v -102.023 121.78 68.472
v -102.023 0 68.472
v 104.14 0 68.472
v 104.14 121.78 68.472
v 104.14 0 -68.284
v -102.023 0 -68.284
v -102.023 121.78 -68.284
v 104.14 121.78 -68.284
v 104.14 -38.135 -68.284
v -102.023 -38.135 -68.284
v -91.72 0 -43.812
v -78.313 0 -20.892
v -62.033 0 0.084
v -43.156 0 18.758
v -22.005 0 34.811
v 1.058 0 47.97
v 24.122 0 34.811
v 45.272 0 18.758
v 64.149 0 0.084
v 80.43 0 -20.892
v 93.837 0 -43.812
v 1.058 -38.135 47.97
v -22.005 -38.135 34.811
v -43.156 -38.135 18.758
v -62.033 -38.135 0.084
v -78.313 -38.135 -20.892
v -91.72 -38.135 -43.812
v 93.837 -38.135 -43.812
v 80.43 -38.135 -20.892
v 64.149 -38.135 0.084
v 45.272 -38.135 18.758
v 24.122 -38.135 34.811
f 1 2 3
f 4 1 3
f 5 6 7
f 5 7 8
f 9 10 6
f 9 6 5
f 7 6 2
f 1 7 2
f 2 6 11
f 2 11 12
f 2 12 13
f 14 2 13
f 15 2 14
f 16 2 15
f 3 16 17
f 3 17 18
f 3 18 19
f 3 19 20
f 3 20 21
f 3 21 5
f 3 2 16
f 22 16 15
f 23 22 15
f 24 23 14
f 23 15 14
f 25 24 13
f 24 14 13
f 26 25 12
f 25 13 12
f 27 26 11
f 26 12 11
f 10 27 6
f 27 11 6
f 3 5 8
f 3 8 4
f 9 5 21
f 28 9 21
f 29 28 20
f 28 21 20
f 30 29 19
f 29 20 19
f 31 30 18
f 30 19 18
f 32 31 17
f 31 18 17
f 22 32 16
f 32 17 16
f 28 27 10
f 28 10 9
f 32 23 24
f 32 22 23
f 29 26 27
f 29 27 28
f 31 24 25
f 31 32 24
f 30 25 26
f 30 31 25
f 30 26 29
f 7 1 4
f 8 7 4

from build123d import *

# Parameters (mm, degrees)
F0_W        = 206.1633169651
F0_H        = 136.7557346821
F3_DEPTH    = 38.1348449737
F7_T1_DEPTH = 998.2832658749
F8_W        = 206.1633169651
F8_H        = 136.7557346821
F8_W_2      = 174.7721135616
F8_H_2      = 16.5176689625
F8_W_3      = 117.4946576357
F8_H_3      = 18.816370517
F2_W        = 206.1633169651
F2_H        = 136.7557346821
F9_DEPTH    = 121.7797268182


# Not quite as in the source:
# - a fillet or chamfer that OpenCascade refuses, or shapes differently, is made with other operations: its cross-section is extruded or revolved along the edge and cut away or added
# - the program builds the solid bodies; features that only make, move or delete a surface that nothing else refers to are left out


with BuildPart() as f3:
    # F0 (on Front) → F3 (new body)
    with BuildSketch(Plane.XZ):
        with Locations((1.0583624244, 0.0938400626)):
            Rectangle(F0_W, F0_H)
    extrude(amount=F3_DEPTH)

    # F7: fillet of radius 203.2 on 2 edges, made by hand

    # F7_s2 → F7_t1 (cut)
    with BuildSketch(Plane.XZ.offset(-480.0742104506)):
        with BuildLine():
            ThreePointArc((104.1400209069, -68.2840272784), (29.9847726477, 30.7886471902), (-87.8896632733, 68.4717074037))
            Line((-87.8896632733, 68.4717074037), (104.1400209069, 68.4717074037))
            Line((104.1400209069, 68.4717074037), (104.1400209069, -68.2840272784))
        make_face()
        with BuildLine():
            ThreePointArc((90.0063881221, 68.4717074037), (-27.868047799, 30.7886471902), (-102.0232960582, -68.2840272784))
            Line((-102.0232960582, -68.2840272784), (-102.0232960582, 68.4717074037))
            Line((-102.0232960582, 68.4717074037), (90.0063881221, 68.4717074037))
        make_face()
    extrude(amount=F7_T1_DEPTH, mode=Mode.SUBTRACT)

    # F8 (on face) + F2 (on face) → F9 (join)
    with BuildSketch(Plane.XZ):
        with Locations((1.0583624244, 0.0938400626)):
            Rectangle(F8_W, F8_H)
        with Locations((0, -32.6089076698)):
            Rectangle(F8_W_2, F8_H_2, mode=Mode.SUBTRACT)
        with Locations((10.9684318304, -3.3599911258)):
            Rectangle(F8_W_3, F8_H_3, mode=Mode.SUBTRACT)
    with BuildSketch(Plane.XZ):
        with Locations((1.0583624244, 0.0938400626)):
            Rectangle(F2_W, F2_H)
    extrude(amount=-F9_DEPTH)


solid = f3.part
